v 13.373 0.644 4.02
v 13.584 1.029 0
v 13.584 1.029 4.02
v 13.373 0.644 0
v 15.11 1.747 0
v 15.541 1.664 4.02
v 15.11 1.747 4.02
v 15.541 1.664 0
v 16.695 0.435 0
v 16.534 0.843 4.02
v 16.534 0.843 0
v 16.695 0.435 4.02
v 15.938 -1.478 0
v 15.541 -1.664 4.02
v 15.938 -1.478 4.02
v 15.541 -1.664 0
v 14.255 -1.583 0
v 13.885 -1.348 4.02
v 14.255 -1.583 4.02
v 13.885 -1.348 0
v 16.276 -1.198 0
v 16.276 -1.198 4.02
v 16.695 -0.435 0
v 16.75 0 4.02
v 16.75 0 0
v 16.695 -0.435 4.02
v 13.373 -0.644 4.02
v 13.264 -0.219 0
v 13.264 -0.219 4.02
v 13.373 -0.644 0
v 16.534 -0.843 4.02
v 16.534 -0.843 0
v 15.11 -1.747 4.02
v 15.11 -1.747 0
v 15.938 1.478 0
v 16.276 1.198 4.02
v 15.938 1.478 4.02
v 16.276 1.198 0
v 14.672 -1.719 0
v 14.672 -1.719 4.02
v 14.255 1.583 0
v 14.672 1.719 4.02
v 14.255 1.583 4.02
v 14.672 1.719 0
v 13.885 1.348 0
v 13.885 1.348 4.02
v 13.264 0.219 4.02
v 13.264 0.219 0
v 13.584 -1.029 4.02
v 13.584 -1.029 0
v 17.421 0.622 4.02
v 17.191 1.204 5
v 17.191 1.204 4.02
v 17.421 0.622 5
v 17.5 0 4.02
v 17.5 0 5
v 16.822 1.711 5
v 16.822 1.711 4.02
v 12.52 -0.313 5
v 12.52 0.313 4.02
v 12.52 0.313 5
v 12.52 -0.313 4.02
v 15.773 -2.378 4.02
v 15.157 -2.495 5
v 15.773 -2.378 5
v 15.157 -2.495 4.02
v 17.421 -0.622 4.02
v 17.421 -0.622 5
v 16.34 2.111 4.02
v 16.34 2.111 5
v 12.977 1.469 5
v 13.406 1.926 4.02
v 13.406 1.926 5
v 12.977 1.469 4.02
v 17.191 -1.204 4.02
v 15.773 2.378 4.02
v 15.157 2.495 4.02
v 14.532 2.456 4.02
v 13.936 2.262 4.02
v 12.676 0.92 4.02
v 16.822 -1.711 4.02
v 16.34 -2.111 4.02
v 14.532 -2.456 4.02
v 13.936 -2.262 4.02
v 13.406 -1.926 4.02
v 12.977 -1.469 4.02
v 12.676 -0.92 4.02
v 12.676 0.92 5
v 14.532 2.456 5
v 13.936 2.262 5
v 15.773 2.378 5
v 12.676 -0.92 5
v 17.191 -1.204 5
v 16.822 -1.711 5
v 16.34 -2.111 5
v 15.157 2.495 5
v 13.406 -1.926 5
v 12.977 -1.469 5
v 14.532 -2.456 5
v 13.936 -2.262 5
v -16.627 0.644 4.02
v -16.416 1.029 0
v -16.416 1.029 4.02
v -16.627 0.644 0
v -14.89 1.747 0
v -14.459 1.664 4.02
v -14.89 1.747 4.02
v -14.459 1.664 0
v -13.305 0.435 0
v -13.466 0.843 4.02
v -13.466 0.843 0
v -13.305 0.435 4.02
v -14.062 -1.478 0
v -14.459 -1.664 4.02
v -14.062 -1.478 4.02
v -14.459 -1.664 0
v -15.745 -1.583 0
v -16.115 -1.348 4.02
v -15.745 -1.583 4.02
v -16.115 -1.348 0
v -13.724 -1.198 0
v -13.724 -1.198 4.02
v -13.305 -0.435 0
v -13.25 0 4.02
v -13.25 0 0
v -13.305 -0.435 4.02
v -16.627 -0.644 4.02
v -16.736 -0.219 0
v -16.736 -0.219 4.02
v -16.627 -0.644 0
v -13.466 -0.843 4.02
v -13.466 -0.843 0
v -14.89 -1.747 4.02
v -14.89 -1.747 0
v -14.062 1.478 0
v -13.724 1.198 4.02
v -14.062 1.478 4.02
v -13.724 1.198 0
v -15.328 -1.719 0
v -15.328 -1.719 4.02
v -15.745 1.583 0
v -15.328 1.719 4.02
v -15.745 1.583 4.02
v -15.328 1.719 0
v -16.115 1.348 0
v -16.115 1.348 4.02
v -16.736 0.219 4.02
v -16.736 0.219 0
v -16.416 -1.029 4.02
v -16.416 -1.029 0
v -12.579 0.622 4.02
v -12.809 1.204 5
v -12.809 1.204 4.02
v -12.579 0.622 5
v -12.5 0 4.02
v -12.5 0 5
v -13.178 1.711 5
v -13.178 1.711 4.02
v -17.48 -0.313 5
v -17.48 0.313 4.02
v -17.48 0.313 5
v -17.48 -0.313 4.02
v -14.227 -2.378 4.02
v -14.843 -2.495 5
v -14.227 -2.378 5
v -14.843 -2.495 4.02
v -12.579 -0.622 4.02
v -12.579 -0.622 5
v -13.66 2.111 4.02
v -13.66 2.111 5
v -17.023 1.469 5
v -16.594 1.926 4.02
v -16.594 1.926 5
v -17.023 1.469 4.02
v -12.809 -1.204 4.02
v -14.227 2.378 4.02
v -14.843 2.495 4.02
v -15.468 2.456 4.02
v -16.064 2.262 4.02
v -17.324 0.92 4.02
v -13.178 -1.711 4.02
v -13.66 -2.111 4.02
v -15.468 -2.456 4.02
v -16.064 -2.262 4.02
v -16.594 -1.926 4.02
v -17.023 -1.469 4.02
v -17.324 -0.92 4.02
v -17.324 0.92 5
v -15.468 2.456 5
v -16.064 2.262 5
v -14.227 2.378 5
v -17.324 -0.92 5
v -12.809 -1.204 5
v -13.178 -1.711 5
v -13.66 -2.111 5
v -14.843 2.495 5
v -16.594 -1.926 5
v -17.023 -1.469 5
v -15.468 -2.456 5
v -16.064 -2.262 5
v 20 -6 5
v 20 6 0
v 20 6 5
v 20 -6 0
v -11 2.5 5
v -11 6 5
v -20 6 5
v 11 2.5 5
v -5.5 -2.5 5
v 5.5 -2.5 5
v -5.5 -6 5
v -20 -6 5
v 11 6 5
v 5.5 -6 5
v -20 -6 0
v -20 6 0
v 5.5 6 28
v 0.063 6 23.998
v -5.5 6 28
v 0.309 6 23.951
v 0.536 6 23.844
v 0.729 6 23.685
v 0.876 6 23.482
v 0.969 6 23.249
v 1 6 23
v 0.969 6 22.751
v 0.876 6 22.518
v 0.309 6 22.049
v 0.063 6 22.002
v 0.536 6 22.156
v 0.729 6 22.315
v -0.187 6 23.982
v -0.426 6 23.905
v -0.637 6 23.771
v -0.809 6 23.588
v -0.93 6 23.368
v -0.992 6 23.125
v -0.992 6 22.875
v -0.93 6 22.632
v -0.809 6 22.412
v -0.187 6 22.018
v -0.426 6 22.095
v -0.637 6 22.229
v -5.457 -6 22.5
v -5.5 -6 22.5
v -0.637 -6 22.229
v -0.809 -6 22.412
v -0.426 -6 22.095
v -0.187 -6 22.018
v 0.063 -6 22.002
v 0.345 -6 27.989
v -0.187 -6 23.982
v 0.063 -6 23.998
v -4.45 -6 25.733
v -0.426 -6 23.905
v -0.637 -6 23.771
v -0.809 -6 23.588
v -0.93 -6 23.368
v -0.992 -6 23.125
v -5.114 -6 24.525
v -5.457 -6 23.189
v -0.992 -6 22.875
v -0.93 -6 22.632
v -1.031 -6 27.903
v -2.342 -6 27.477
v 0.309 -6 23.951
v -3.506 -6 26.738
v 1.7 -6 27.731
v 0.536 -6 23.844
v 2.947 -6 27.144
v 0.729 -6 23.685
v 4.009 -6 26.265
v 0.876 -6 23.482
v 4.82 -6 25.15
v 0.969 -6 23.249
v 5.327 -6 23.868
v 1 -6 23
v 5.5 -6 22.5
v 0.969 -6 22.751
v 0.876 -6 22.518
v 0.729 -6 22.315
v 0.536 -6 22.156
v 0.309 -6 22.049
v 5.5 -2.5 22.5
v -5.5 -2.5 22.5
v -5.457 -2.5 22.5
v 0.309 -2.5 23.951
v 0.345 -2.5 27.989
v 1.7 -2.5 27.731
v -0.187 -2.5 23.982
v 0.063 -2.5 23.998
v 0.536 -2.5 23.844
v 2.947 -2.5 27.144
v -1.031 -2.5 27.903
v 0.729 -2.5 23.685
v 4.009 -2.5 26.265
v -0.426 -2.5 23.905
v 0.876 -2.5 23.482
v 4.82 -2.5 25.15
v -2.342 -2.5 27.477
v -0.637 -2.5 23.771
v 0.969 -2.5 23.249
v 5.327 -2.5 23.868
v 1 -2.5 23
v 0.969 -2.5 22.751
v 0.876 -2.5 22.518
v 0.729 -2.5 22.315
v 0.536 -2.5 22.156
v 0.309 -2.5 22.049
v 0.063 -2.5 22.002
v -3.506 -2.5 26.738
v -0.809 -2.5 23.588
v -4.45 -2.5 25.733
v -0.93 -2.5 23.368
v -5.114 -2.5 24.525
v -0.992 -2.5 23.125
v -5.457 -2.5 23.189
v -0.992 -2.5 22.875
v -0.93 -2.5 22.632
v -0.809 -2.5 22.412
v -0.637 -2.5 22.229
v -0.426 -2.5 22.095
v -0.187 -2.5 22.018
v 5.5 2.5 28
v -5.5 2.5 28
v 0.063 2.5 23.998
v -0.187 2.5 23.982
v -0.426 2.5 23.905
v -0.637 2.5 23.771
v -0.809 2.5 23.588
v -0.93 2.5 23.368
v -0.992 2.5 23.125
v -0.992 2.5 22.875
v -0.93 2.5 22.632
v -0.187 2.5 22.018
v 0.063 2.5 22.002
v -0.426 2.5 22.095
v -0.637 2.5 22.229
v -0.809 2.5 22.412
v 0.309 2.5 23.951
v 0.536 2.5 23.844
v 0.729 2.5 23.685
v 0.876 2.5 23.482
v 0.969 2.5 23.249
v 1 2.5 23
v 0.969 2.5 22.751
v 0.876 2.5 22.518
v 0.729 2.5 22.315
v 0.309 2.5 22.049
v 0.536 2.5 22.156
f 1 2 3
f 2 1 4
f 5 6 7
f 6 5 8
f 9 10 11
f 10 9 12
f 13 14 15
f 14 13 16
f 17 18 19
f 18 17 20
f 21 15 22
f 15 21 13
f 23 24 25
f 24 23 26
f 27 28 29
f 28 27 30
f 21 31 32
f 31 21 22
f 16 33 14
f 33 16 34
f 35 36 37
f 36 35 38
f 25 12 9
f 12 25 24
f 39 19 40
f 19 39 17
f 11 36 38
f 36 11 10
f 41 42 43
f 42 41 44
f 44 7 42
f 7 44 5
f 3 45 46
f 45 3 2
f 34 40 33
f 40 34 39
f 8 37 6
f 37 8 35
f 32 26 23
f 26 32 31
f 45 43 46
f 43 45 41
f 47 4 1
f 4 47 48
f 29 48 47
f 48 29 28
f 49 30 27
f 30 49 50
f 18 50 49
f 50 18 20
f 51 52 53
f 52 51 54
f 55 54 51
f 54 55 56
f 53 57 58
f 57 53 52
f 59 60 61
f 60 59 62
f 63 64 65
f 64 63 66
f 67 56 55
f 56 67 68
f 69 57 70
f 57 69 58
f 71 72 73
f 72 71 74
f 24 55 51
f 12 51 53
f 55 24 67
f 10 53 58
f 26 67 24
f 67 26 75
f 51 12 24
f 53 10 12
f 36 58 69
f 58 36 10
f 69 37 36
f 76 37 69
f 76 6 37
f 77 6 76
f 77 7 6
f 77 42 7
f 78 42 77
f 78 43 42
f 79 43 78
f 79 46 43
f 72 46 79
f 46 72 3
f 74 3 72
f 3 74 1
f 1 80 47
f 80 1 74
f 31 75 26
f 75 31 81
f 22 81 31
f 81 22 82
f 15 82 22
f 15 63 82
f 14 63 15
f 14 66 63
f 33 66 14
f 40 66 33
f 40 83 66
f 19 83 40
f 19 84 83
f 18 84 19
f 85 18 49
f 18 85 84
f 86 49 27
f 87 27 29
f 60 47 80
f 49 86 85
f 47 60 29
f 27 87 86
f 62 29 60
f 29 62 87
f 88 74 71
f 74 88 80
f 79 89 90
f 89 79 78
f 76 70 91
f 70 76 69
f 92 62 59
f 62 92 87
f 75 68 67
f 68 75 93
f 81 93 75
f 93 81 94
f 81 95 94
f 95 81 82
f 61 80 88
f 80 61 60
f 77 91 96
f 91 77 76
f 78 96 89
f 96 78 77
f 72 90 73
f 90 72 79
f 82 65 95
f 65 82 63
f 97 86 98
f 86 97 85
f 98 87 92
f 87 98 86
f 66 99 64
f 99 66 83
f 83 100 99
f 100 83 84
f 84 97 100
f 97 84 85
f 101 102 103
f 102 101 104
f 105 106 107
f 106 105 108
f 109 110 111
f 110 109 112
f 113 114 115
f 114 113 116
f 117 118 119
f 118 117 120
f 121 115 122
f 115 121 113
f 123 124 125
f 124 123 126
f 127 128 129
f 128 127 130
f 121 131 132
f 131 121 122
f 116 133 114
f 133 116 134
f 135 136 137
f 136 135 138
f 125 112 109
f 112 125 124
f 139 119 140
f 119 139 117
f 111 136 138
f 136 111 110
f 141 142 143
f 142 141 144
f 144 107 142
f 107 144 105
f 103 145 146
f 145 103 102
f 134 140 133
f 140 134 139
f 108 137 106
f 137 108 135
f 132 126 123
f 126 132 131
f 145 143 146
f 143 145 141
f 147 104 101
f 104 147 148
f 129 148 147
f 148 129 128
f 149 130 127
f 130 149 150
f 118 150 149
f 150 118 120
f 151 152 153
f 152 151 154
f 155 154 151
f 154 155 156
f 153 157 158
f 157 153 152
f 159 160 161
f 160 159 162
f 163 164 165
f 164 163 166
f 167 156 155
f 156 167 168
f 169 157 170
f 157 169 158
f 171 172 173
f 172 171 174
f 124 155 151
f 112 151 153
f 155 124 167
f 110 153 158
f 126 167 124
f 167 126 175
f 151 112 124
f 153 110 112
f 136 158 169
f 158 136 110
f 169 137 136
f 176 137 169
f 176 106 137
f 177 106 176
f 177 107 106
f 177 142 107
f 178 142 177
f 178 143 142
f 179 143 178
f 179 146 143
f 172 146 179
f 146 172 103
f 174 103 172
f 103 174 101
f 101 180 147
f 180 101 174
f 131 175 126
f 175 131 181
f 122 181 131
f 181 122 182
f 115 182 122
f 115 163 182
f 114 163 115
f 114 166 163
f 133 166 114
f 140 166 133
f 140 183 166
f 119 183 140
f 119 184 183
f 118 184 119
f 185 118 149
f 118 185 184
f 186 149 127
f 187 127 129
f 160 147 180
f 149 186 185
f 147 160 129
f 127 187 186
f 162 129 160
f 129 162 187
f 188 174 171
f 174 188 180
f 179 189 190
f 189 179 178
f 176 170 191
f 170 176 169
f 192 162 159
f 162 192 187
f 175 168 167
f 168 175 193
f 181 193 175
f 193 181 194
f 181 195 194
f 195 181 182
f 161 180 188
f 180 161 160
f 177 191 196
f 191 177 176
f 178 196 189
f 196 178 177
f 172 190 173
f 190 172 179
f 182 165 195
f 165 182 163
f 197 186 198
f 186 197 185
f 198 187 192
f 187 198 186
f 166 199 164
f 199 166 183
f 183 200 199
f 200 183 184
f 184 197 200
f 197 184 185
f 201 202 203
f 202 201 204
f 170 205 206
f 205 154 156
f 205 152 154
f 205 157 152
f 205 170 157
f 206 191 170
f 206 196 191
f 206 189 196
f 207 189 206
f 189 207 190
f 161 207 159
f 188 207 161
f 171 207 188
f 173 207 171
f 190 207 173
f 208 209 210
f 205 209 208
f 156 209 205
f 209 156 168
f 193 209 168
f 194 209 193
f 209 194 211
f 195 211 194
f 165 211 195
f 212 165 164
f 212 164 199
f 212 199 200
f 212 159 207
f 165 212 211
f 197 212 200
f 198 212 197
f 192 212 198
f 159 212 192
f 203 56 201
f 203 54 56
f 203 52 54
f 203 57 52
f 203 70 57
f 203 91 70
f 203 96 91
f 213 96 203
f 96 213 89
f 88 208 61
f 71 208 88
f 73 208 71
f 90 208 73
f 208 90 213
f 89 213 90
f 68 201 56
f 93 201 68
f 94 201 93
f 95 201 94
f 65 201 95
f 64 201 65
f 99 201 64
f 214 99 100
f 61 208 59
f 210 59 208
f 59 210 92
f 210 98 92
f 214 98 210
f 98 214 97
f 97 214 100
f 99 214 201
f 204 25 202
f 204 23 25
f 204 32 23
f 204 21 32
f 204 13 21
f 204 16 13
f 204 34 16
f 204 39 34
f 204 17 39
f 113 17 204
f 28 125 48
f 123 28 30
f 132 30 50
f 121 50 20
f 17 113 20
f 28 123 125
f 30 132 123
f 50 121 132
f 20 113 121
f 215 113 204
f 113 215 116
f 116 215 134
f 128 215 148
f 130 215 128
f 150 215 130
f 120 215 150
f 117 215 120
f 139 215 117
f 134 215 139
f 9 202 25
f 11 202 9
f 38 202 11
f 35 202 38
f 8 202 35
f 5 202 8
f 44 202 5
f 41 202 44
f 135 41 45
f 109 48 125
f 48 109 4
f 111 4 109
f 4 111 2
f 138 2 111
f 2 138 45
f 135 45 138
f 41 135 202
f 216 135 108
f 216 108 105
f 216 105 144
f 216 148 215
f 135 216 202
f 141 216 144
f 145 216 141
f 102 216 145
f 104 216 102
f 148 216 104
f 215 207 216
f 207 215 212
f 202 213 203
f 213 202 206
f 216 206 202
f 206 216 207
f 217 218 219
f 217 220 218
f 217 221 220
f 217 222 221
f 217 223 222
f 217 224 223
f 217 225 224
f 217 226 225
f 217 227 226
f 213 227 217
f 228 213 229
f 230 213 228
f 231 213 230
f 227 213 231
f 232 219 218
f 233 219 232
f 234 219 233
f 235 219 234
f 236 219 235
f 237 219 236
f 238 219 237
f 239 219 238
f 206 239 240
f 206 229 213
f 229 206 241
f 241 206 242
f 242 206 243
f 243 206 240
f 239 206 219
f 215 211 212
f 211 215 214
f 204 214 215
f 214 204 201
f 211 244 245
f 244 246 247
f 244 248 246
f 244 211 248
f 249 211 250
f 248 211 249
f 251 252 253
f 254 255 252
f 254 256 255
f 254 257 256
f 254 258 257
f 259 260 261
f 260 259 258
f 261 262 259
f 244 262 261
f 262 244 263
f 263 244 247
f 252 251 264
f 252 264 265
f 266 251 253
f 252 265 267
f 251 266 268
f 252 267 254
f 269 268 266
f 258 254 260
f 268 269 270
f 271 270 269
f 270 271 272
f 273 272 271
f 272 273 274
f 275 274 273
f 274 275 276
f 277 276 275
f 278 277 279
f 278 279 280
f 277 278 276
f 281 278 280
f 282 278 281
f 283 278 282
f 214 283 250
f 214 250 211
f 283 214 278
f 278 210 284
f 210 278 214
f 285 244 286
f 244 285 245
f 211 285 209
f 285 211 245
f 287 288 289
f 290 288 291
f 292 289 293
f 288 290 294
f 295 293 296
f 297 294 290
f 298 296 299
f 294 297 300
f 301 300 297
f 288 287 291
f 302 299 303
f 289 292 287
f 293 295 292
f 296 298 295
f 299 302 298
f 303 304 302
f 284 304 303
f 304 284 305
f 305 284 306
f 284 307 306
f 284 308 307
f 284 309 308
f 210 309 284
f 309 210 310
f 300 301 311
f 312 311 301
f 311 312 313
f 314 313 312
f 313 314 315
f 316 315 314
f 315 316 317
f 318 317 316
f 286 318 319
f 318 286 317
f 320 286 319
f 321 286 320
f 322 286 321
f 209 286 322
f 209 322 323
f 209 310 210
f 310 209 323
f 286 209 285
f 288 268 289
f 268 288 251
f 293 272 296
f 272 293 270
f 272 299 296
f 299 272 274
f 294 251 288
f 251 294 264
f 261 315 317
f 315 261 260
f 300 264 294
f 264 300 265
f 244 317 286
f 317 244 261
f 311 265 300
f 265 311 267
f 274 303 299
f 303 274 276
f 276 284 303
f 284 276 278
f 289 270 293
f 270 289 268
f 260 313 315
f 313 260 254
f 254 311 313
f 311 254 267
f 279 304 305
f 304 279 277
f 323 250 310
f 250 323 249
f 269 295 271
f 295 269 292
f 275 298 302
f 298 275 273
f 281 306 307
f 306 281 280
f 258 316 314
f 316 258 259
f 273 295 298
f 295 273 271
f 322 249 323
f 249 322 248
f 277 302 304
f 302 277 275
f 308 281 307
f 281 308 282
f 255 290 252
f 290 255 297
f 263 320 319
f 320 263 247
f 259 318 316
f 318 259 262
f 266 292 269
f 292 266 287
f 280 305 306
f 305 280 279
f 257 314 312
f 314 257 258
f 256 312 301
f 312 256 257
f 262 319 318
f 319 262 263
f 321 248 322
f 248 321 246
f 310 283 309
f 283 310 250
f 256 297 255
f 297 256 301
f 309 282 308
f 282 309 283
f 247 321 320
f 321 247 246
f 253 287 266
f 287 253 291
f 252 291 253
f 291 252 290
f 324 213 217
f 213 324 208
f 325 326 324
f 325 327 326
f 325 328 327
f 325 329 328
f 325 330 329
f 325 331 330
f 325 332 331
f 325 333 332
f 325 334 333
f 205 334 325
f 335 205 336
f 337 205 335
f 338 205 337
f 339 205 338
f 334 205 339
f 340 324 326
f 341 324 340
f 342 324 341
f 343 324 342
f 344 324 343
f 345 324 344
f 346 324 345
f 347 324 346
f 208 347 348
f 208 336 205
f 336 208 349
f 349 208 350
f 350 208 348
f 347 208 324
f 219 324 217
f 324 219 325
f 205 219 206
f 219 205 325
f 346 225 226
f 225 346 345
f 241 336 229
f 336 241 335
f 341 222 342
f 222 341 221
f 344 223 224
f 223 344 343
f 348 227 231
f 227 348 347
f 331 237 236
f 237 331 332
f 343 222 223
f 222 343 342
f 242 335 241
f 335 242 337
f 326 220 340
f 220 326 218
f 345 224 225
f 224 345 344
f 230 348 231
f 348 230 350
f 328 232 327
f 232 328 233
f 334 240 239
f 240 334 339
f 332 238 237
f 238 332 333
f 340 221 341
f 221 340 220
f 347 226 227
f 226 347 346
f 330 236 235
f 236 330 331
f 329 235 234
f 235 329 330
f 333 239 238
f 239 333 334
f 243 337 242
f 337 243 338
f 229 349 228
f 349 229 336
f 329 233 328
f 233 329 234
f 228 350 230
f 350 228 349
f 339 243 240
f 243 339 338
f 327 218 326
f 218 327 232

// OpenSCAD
part_x = 40;
part_y = 12;
part_z = 28;

epsilon = 0.01;

module base() {
    base_bar_x = part_x;
    base_bar_y = part_y;
    base_bar_z = 5;

    translate([0,0,2.5])
    cube([base_bar_x, base_bar_y, base_bar_z], true);
}



thin_bar_x = 11;
bar_y = 3.5;
bar_z = 23;

module thin_bar() {
    thin_bar_y = bar_y;
    thin_bar_z = bar_z;
    
    union() {
        translate([-thin_bar_x/2, -part_y/2, 5])
        cube([thin_bar_x, thin_bar_y, thin_bar_z-thin_bar_x/2]);
        
        translate([0, -part_y/2, part_z-thin_bar_x/2])
        rotate([-90,0,0])
        cylinder(bar_y, d=thin_bar_x, $fn=25);
    }
    
    
}



module thick_bar() {
    CubePoints = [
      [  0,  0,  0 ],           //0
      [ 22,  0,  0 ],           //1
      [ 22,  bar_y,  0 ],       //2
      [  0,  bar_y,  0 ],       //3
      [  5.5,  0,  23 ],        //4
      [ 16.5,  0,  23 ],        //5
      [ 16.5,  bar_y,  23 ],    //6
      [  5.5,  bar_y,  23 ]];   //7
  
    CubeFaces = [
      [0,1,2,3],  // bottom
      [4,5,1,0],  // front
      [7,6,5,4],  // top
      [5,6,2,1],  // right
      [6,7,3,2],  // back
      [7,4,0,3]]; // left
    
    thick_bar_x = 22;
    thick_bar_y = bar_y;
    thick_bar_z = bar_z;
    translate([-11,-bar_y/2, 0])
    polyhedron( CubePoints, CubeFaces );
    //cube([thick_bar_x, thick_bar_y, thick_bar_z], true);
    
}

module holder_hole() {
    rotate([90,0,0])
    cylinder(12+epsilon*2, 1, true, $fn=25);
}




module screw_hole() {
    union() {
        translate([0,0,-epsilon])
        cylinder(5+2*epsilon,d=3.5,$fn=25);
        translate([0,0,5+2*epsilon-1])
        cylinder(1,d=5,$fn=25);
    }
}







union() {
    difference() {
        base();
        translate([15,0,0])
        screw_hole();
        translate([-15,0,0])
        screw_hole();
    };



    difference() {
        thin_bar();
        translate([0,part_y/2+epsilon, 23])
        holder_hole();
    };

    difference() {
        translate([0,part_y/2-bar_y/2,5])
        thick_bar();
        translate([0,part_y/2+epsilon, 23])
        holder_hole();
    };
}
